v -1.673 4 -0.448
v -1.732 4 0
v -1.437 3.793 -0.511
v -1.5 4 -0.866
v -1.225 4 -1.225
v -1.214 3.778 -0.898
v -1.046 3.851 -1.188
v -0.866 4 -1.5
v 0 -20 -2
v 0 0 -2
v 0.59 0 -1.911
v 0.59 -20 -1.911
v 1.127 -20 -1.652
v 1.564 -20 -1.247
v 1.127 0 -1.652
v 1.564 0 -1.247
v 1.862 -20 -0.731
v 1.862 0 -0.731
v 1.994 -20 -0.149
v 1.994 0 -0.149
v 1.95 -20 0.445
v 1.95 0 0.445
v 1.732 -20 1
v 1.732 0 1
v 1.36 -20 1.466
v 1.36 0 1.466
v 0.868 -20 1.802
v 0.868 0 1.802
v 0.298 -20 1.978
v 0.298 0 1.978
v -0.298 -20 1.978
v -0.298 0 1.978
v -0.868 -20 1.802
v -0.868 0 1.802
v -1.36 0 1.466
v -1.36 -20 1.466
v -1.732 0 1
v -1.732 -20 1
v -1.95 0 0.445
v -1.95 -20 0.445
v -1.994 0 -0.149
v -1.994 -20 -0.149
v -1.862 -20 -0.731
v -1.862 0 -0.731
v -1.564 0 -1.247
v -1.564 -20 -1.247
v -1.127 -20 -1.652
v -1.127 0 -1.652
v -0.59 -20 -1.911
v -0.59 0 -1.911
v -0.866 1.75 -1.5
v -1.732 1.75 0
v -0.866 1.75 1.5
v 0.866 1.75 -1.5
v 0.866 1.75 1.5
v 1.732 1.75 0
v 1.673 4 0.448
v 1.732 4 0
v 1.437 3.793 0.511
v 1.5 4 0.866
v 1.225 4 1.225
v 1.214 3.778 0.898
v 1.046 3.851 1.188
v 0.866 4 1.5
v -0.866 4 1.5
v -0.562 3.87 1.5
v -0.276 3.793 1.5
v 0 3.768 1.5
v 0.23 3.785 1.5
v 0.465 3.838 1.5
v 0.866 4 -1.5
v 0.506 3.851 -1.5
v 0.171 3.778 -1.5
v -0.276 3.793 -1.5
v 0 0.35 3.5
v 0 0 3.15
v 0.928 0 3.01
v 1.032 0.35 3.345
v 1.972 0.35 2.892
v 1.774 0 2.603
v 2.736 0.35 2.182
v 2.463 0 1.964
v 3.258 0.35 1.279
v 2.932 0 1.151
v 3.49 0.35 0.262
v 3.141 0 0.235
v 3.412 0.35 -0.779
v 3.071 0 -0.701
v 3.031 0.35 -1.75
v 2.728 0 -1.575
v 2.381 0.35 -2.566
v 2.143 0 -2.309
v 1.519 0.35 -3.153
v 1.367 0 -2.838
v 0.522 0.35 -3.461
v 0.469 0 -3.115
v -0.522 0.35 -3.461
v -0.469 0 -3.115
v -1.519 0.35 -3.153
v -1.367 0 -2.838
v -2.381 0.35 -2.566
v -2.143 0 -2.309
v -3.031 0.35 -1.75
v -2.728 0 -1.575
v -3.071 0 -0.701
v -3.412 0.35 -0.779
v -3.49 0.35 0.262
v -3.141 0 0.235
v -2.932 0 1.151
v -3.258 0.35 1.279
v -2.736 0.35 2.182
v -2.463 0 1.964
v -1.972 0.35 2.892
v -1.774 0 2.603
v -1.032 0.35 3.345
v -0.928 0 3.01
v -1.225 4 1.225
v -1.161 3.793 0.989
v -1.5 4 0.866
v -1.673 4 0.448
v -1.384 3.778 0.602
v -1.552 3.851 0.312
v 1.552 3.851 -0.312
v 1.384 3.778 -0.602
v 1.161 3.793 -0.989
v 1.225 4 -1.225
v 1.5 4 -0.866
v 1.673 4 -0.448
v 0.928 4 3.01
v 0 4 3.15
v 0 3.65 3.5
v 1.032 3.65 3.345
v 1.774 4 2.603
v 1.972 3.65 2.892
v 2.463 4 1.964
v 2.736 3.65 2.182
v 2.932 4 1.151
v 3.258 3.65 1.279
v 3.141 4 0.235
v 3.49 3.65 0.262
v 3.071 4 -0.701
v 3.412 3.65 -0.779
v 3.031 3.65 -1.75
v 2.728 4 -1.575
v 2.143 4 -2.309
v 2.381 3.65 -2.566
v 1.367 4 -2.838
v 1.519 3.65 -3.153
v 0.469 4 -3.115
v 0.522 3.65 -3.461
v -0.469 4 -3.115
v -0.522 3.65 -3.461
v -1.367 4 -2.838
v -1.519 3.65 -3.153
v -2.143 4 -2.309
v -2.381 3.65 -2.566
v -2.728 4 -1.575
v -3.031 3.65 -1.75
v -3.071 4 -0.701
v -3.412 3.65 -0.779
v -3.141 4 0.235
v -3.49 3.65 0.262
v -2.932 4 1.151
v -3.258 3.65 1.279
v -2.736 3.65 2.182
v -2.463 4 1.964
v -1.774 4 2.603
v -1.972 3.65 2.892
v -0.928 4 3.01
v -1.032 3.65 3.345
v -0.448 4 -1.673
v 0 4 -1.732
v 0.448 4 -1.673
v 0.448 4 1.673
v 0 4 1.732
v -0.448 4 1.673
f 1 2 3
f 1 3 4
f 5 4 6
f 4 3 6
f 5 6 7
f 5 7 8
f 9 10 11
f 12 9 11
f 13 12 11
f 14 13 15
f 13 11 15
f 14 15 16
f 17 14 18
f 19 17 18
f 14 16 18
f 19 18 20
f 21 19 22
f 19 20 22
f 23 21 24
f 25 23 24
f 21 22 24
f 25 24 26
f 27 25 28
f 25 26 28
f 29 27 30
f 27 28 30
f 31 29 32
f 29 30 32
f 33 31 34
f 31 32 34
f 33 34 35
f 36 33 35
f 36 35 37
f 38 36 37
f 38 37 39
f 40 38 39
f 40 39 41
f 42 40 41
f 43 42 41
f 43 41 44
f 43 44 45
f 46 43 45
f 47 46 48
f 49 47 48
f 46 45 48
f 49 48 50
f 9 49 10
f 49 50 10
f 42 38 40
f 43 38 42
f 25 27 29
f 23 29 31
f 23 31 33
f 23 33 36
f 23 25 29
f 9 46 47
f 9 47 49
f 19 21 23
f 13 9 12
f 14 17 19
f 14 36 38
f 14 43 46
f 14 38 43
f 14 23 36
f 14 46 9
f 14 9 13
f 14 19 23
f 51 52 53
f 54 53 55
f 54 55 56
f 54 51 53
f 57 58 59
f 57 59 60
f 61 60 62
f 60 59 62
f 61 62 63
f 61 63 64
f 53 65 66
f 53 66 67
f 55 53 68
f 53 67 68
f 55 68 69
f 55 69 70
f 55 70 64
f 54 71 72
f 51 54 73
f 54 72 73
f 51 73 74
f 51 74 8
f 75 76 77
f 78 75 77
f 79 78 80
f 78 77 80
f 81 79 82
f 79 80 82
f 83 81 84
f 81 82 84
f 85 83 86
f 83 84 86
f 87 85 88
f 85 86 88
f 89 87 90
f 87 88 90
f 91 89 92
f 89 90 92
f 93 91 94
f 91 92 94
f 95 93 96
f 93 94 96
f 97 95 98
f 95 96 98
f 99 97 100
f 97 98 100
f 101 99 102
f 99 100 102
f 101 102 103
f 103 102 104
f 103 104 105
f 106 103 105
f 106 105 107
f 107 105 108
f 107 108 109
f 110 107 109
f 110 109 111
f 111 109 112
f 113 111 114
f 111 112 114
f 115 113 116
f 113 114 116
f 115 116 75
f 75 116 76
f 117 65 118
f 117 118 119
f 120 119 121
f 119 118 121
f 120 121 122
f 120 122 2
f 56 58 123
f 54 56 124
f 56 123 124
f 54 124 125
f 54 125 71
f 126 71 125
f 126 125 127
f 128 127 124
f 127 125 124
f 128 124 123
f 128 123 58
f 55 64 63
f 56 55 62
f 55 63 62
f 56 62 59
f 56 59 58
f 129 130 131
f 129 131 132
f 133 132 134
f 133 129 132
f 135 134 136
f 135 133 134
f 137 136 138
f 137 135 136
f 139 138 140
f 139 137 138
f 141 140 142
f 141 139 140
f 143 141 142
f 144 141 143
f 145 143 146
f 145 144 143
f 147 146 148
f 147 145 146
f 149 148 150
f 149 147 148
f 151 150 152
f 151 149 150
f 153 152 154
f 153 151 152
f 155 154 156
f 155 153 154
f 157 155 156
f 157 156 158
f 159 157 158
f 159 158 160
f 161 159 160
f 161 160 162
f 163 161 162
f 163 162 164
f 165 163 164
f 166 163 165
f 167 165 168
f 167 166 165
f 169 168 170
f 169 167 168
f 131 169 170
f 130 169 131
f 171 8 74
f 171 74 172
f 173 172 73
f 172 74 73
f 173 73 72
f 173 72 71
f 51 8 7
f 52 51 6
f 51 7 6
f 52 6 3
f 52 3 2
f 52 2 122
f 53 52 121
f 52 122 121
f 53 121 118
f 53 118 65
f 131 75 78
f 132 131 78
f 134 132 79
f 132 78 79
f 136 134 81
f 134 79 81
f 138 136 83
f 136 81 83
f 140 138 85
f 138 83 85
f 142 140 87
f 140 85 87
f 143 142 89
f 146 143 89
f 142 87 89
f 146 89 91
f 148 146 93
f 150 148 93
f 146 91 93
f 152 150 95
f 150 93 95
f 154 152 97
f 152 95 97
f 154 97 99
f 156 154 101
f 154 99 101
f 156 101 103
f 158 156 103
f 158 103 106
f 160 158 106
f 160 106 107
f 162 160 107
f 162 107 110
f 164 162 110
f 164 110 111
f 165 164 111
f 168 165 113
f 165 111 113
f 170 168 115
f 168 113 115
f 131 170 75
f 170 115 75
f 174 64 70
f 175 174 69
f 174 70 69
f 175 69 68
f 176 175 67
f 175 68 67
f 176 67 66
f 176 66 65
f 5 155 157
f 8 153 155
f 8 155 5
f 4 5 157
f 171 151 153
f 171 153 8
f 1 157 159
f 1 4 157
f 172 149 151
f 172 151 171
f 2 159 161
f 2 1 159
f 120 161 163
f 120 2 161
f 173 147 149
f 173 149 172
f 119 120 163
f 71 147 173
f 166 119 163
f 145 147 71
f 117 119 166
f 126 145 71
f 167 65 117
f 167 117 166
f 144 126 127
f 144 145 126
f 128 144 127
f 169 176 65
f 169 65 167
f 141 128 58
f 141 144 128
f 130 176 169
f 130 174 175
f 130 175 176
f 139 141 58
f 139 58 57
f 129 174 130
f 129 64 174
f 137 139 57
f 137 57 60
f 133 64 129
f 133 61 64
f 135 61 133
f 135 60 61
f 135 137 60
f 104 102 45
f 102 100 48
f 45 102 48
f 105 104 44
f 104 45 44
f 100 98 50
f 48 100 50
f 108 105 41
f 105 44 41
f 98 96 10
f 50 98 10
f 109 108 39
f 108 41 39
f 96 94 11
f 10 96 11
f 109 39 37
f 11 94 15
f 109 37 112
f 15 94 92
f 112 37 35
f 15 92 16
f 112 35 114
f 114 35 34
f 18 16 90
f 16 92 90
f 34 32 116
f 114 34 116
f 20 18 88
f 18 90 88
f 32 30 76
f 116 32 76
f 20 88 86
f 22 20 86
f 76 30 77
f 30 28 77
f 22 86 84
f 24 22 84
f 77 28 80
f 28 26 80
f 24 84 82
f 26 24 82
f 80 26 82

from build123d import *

# Parameters (mm, degrees)
SKETCH1_R           = 3.5
BOSS_EXTRUDE1_DEPTH = 4
CUT_EXTRUDE1_DEPTH  = 2.25
CHAMFER1_SIZE       = 0.35
SKETCH_1_R          = 2
EXTRUDE_1_DEPTH     = 20


with BuildPart() as part:
    # Sketch1 → Boss-Extrude1 (new body)
    with BuildSketch(Plane(origin=(0, 0, 0), x_dir=(1, 0, 0), z_dir=(0, 1, 0))):
        with Locations(Location((0, 0, 0), (0, 0, 270))):
            Circle(SKETCH1_R)
    extrude(amount=BOSS_EXTRUDE1_DEPTH)

    # Sketch2 → Cut-Extrude1 (cut)
    with BuildSketch(Plane(origin=(0, 4, 0), x_dir=(1, 0, 0), z_dir=(0, 1, 0))):
        Polygon((0.866025404, 1.5), (-0.866025404, 1.5), (-1.732050808, 0), (-0.866025404, -1.5), (0.866025404, -1.5), (1.732050808, 0), align=None)
    extrude(amount=-CUT_EXTRUDE1_DEPTH, mode=Mode.SUBTRACT)

    # Cut-Extrude2 cone 1 section (through the dimple's axis) → Cut-Extrude2 (revolve, cut)
    with BuildSketch(Plane(origin=(0, 4, 0), x_dir=(0, 0, 1), z_dir=(1, 0, 0))):
        Polygon((0, 0), (1.732050808, 0), (0, 1.732050808), align=None)
    revolve(axis=Axis((0, 4, 0), (0, -1, 0)), mode=Mode.SUBTRACT)

    # Chamfer1
    chamfer1_edges = [part.edges().sort_by_distance(p)[0] for p in [
        (0, 0, -3.5),
        (0, 4, -3.5),
    ]]
    chamfer(chamfer1_edges, length=CHAMFER1_SIZE)

    # 草图1 → 凸台-拉伸1 (add)
    with BuildSketch(Plane(origin=(0, 0, 0), x_dir=(-1, 0, 0), z_dir=(0, -1, 0))):
        with Locations(Location((0, 0, 0), (0, 0, 90))):
            Circle(SKETCH_1_R)
    extrude(amount=EXTRUDE_1_DEPTH)


solid = part.part
